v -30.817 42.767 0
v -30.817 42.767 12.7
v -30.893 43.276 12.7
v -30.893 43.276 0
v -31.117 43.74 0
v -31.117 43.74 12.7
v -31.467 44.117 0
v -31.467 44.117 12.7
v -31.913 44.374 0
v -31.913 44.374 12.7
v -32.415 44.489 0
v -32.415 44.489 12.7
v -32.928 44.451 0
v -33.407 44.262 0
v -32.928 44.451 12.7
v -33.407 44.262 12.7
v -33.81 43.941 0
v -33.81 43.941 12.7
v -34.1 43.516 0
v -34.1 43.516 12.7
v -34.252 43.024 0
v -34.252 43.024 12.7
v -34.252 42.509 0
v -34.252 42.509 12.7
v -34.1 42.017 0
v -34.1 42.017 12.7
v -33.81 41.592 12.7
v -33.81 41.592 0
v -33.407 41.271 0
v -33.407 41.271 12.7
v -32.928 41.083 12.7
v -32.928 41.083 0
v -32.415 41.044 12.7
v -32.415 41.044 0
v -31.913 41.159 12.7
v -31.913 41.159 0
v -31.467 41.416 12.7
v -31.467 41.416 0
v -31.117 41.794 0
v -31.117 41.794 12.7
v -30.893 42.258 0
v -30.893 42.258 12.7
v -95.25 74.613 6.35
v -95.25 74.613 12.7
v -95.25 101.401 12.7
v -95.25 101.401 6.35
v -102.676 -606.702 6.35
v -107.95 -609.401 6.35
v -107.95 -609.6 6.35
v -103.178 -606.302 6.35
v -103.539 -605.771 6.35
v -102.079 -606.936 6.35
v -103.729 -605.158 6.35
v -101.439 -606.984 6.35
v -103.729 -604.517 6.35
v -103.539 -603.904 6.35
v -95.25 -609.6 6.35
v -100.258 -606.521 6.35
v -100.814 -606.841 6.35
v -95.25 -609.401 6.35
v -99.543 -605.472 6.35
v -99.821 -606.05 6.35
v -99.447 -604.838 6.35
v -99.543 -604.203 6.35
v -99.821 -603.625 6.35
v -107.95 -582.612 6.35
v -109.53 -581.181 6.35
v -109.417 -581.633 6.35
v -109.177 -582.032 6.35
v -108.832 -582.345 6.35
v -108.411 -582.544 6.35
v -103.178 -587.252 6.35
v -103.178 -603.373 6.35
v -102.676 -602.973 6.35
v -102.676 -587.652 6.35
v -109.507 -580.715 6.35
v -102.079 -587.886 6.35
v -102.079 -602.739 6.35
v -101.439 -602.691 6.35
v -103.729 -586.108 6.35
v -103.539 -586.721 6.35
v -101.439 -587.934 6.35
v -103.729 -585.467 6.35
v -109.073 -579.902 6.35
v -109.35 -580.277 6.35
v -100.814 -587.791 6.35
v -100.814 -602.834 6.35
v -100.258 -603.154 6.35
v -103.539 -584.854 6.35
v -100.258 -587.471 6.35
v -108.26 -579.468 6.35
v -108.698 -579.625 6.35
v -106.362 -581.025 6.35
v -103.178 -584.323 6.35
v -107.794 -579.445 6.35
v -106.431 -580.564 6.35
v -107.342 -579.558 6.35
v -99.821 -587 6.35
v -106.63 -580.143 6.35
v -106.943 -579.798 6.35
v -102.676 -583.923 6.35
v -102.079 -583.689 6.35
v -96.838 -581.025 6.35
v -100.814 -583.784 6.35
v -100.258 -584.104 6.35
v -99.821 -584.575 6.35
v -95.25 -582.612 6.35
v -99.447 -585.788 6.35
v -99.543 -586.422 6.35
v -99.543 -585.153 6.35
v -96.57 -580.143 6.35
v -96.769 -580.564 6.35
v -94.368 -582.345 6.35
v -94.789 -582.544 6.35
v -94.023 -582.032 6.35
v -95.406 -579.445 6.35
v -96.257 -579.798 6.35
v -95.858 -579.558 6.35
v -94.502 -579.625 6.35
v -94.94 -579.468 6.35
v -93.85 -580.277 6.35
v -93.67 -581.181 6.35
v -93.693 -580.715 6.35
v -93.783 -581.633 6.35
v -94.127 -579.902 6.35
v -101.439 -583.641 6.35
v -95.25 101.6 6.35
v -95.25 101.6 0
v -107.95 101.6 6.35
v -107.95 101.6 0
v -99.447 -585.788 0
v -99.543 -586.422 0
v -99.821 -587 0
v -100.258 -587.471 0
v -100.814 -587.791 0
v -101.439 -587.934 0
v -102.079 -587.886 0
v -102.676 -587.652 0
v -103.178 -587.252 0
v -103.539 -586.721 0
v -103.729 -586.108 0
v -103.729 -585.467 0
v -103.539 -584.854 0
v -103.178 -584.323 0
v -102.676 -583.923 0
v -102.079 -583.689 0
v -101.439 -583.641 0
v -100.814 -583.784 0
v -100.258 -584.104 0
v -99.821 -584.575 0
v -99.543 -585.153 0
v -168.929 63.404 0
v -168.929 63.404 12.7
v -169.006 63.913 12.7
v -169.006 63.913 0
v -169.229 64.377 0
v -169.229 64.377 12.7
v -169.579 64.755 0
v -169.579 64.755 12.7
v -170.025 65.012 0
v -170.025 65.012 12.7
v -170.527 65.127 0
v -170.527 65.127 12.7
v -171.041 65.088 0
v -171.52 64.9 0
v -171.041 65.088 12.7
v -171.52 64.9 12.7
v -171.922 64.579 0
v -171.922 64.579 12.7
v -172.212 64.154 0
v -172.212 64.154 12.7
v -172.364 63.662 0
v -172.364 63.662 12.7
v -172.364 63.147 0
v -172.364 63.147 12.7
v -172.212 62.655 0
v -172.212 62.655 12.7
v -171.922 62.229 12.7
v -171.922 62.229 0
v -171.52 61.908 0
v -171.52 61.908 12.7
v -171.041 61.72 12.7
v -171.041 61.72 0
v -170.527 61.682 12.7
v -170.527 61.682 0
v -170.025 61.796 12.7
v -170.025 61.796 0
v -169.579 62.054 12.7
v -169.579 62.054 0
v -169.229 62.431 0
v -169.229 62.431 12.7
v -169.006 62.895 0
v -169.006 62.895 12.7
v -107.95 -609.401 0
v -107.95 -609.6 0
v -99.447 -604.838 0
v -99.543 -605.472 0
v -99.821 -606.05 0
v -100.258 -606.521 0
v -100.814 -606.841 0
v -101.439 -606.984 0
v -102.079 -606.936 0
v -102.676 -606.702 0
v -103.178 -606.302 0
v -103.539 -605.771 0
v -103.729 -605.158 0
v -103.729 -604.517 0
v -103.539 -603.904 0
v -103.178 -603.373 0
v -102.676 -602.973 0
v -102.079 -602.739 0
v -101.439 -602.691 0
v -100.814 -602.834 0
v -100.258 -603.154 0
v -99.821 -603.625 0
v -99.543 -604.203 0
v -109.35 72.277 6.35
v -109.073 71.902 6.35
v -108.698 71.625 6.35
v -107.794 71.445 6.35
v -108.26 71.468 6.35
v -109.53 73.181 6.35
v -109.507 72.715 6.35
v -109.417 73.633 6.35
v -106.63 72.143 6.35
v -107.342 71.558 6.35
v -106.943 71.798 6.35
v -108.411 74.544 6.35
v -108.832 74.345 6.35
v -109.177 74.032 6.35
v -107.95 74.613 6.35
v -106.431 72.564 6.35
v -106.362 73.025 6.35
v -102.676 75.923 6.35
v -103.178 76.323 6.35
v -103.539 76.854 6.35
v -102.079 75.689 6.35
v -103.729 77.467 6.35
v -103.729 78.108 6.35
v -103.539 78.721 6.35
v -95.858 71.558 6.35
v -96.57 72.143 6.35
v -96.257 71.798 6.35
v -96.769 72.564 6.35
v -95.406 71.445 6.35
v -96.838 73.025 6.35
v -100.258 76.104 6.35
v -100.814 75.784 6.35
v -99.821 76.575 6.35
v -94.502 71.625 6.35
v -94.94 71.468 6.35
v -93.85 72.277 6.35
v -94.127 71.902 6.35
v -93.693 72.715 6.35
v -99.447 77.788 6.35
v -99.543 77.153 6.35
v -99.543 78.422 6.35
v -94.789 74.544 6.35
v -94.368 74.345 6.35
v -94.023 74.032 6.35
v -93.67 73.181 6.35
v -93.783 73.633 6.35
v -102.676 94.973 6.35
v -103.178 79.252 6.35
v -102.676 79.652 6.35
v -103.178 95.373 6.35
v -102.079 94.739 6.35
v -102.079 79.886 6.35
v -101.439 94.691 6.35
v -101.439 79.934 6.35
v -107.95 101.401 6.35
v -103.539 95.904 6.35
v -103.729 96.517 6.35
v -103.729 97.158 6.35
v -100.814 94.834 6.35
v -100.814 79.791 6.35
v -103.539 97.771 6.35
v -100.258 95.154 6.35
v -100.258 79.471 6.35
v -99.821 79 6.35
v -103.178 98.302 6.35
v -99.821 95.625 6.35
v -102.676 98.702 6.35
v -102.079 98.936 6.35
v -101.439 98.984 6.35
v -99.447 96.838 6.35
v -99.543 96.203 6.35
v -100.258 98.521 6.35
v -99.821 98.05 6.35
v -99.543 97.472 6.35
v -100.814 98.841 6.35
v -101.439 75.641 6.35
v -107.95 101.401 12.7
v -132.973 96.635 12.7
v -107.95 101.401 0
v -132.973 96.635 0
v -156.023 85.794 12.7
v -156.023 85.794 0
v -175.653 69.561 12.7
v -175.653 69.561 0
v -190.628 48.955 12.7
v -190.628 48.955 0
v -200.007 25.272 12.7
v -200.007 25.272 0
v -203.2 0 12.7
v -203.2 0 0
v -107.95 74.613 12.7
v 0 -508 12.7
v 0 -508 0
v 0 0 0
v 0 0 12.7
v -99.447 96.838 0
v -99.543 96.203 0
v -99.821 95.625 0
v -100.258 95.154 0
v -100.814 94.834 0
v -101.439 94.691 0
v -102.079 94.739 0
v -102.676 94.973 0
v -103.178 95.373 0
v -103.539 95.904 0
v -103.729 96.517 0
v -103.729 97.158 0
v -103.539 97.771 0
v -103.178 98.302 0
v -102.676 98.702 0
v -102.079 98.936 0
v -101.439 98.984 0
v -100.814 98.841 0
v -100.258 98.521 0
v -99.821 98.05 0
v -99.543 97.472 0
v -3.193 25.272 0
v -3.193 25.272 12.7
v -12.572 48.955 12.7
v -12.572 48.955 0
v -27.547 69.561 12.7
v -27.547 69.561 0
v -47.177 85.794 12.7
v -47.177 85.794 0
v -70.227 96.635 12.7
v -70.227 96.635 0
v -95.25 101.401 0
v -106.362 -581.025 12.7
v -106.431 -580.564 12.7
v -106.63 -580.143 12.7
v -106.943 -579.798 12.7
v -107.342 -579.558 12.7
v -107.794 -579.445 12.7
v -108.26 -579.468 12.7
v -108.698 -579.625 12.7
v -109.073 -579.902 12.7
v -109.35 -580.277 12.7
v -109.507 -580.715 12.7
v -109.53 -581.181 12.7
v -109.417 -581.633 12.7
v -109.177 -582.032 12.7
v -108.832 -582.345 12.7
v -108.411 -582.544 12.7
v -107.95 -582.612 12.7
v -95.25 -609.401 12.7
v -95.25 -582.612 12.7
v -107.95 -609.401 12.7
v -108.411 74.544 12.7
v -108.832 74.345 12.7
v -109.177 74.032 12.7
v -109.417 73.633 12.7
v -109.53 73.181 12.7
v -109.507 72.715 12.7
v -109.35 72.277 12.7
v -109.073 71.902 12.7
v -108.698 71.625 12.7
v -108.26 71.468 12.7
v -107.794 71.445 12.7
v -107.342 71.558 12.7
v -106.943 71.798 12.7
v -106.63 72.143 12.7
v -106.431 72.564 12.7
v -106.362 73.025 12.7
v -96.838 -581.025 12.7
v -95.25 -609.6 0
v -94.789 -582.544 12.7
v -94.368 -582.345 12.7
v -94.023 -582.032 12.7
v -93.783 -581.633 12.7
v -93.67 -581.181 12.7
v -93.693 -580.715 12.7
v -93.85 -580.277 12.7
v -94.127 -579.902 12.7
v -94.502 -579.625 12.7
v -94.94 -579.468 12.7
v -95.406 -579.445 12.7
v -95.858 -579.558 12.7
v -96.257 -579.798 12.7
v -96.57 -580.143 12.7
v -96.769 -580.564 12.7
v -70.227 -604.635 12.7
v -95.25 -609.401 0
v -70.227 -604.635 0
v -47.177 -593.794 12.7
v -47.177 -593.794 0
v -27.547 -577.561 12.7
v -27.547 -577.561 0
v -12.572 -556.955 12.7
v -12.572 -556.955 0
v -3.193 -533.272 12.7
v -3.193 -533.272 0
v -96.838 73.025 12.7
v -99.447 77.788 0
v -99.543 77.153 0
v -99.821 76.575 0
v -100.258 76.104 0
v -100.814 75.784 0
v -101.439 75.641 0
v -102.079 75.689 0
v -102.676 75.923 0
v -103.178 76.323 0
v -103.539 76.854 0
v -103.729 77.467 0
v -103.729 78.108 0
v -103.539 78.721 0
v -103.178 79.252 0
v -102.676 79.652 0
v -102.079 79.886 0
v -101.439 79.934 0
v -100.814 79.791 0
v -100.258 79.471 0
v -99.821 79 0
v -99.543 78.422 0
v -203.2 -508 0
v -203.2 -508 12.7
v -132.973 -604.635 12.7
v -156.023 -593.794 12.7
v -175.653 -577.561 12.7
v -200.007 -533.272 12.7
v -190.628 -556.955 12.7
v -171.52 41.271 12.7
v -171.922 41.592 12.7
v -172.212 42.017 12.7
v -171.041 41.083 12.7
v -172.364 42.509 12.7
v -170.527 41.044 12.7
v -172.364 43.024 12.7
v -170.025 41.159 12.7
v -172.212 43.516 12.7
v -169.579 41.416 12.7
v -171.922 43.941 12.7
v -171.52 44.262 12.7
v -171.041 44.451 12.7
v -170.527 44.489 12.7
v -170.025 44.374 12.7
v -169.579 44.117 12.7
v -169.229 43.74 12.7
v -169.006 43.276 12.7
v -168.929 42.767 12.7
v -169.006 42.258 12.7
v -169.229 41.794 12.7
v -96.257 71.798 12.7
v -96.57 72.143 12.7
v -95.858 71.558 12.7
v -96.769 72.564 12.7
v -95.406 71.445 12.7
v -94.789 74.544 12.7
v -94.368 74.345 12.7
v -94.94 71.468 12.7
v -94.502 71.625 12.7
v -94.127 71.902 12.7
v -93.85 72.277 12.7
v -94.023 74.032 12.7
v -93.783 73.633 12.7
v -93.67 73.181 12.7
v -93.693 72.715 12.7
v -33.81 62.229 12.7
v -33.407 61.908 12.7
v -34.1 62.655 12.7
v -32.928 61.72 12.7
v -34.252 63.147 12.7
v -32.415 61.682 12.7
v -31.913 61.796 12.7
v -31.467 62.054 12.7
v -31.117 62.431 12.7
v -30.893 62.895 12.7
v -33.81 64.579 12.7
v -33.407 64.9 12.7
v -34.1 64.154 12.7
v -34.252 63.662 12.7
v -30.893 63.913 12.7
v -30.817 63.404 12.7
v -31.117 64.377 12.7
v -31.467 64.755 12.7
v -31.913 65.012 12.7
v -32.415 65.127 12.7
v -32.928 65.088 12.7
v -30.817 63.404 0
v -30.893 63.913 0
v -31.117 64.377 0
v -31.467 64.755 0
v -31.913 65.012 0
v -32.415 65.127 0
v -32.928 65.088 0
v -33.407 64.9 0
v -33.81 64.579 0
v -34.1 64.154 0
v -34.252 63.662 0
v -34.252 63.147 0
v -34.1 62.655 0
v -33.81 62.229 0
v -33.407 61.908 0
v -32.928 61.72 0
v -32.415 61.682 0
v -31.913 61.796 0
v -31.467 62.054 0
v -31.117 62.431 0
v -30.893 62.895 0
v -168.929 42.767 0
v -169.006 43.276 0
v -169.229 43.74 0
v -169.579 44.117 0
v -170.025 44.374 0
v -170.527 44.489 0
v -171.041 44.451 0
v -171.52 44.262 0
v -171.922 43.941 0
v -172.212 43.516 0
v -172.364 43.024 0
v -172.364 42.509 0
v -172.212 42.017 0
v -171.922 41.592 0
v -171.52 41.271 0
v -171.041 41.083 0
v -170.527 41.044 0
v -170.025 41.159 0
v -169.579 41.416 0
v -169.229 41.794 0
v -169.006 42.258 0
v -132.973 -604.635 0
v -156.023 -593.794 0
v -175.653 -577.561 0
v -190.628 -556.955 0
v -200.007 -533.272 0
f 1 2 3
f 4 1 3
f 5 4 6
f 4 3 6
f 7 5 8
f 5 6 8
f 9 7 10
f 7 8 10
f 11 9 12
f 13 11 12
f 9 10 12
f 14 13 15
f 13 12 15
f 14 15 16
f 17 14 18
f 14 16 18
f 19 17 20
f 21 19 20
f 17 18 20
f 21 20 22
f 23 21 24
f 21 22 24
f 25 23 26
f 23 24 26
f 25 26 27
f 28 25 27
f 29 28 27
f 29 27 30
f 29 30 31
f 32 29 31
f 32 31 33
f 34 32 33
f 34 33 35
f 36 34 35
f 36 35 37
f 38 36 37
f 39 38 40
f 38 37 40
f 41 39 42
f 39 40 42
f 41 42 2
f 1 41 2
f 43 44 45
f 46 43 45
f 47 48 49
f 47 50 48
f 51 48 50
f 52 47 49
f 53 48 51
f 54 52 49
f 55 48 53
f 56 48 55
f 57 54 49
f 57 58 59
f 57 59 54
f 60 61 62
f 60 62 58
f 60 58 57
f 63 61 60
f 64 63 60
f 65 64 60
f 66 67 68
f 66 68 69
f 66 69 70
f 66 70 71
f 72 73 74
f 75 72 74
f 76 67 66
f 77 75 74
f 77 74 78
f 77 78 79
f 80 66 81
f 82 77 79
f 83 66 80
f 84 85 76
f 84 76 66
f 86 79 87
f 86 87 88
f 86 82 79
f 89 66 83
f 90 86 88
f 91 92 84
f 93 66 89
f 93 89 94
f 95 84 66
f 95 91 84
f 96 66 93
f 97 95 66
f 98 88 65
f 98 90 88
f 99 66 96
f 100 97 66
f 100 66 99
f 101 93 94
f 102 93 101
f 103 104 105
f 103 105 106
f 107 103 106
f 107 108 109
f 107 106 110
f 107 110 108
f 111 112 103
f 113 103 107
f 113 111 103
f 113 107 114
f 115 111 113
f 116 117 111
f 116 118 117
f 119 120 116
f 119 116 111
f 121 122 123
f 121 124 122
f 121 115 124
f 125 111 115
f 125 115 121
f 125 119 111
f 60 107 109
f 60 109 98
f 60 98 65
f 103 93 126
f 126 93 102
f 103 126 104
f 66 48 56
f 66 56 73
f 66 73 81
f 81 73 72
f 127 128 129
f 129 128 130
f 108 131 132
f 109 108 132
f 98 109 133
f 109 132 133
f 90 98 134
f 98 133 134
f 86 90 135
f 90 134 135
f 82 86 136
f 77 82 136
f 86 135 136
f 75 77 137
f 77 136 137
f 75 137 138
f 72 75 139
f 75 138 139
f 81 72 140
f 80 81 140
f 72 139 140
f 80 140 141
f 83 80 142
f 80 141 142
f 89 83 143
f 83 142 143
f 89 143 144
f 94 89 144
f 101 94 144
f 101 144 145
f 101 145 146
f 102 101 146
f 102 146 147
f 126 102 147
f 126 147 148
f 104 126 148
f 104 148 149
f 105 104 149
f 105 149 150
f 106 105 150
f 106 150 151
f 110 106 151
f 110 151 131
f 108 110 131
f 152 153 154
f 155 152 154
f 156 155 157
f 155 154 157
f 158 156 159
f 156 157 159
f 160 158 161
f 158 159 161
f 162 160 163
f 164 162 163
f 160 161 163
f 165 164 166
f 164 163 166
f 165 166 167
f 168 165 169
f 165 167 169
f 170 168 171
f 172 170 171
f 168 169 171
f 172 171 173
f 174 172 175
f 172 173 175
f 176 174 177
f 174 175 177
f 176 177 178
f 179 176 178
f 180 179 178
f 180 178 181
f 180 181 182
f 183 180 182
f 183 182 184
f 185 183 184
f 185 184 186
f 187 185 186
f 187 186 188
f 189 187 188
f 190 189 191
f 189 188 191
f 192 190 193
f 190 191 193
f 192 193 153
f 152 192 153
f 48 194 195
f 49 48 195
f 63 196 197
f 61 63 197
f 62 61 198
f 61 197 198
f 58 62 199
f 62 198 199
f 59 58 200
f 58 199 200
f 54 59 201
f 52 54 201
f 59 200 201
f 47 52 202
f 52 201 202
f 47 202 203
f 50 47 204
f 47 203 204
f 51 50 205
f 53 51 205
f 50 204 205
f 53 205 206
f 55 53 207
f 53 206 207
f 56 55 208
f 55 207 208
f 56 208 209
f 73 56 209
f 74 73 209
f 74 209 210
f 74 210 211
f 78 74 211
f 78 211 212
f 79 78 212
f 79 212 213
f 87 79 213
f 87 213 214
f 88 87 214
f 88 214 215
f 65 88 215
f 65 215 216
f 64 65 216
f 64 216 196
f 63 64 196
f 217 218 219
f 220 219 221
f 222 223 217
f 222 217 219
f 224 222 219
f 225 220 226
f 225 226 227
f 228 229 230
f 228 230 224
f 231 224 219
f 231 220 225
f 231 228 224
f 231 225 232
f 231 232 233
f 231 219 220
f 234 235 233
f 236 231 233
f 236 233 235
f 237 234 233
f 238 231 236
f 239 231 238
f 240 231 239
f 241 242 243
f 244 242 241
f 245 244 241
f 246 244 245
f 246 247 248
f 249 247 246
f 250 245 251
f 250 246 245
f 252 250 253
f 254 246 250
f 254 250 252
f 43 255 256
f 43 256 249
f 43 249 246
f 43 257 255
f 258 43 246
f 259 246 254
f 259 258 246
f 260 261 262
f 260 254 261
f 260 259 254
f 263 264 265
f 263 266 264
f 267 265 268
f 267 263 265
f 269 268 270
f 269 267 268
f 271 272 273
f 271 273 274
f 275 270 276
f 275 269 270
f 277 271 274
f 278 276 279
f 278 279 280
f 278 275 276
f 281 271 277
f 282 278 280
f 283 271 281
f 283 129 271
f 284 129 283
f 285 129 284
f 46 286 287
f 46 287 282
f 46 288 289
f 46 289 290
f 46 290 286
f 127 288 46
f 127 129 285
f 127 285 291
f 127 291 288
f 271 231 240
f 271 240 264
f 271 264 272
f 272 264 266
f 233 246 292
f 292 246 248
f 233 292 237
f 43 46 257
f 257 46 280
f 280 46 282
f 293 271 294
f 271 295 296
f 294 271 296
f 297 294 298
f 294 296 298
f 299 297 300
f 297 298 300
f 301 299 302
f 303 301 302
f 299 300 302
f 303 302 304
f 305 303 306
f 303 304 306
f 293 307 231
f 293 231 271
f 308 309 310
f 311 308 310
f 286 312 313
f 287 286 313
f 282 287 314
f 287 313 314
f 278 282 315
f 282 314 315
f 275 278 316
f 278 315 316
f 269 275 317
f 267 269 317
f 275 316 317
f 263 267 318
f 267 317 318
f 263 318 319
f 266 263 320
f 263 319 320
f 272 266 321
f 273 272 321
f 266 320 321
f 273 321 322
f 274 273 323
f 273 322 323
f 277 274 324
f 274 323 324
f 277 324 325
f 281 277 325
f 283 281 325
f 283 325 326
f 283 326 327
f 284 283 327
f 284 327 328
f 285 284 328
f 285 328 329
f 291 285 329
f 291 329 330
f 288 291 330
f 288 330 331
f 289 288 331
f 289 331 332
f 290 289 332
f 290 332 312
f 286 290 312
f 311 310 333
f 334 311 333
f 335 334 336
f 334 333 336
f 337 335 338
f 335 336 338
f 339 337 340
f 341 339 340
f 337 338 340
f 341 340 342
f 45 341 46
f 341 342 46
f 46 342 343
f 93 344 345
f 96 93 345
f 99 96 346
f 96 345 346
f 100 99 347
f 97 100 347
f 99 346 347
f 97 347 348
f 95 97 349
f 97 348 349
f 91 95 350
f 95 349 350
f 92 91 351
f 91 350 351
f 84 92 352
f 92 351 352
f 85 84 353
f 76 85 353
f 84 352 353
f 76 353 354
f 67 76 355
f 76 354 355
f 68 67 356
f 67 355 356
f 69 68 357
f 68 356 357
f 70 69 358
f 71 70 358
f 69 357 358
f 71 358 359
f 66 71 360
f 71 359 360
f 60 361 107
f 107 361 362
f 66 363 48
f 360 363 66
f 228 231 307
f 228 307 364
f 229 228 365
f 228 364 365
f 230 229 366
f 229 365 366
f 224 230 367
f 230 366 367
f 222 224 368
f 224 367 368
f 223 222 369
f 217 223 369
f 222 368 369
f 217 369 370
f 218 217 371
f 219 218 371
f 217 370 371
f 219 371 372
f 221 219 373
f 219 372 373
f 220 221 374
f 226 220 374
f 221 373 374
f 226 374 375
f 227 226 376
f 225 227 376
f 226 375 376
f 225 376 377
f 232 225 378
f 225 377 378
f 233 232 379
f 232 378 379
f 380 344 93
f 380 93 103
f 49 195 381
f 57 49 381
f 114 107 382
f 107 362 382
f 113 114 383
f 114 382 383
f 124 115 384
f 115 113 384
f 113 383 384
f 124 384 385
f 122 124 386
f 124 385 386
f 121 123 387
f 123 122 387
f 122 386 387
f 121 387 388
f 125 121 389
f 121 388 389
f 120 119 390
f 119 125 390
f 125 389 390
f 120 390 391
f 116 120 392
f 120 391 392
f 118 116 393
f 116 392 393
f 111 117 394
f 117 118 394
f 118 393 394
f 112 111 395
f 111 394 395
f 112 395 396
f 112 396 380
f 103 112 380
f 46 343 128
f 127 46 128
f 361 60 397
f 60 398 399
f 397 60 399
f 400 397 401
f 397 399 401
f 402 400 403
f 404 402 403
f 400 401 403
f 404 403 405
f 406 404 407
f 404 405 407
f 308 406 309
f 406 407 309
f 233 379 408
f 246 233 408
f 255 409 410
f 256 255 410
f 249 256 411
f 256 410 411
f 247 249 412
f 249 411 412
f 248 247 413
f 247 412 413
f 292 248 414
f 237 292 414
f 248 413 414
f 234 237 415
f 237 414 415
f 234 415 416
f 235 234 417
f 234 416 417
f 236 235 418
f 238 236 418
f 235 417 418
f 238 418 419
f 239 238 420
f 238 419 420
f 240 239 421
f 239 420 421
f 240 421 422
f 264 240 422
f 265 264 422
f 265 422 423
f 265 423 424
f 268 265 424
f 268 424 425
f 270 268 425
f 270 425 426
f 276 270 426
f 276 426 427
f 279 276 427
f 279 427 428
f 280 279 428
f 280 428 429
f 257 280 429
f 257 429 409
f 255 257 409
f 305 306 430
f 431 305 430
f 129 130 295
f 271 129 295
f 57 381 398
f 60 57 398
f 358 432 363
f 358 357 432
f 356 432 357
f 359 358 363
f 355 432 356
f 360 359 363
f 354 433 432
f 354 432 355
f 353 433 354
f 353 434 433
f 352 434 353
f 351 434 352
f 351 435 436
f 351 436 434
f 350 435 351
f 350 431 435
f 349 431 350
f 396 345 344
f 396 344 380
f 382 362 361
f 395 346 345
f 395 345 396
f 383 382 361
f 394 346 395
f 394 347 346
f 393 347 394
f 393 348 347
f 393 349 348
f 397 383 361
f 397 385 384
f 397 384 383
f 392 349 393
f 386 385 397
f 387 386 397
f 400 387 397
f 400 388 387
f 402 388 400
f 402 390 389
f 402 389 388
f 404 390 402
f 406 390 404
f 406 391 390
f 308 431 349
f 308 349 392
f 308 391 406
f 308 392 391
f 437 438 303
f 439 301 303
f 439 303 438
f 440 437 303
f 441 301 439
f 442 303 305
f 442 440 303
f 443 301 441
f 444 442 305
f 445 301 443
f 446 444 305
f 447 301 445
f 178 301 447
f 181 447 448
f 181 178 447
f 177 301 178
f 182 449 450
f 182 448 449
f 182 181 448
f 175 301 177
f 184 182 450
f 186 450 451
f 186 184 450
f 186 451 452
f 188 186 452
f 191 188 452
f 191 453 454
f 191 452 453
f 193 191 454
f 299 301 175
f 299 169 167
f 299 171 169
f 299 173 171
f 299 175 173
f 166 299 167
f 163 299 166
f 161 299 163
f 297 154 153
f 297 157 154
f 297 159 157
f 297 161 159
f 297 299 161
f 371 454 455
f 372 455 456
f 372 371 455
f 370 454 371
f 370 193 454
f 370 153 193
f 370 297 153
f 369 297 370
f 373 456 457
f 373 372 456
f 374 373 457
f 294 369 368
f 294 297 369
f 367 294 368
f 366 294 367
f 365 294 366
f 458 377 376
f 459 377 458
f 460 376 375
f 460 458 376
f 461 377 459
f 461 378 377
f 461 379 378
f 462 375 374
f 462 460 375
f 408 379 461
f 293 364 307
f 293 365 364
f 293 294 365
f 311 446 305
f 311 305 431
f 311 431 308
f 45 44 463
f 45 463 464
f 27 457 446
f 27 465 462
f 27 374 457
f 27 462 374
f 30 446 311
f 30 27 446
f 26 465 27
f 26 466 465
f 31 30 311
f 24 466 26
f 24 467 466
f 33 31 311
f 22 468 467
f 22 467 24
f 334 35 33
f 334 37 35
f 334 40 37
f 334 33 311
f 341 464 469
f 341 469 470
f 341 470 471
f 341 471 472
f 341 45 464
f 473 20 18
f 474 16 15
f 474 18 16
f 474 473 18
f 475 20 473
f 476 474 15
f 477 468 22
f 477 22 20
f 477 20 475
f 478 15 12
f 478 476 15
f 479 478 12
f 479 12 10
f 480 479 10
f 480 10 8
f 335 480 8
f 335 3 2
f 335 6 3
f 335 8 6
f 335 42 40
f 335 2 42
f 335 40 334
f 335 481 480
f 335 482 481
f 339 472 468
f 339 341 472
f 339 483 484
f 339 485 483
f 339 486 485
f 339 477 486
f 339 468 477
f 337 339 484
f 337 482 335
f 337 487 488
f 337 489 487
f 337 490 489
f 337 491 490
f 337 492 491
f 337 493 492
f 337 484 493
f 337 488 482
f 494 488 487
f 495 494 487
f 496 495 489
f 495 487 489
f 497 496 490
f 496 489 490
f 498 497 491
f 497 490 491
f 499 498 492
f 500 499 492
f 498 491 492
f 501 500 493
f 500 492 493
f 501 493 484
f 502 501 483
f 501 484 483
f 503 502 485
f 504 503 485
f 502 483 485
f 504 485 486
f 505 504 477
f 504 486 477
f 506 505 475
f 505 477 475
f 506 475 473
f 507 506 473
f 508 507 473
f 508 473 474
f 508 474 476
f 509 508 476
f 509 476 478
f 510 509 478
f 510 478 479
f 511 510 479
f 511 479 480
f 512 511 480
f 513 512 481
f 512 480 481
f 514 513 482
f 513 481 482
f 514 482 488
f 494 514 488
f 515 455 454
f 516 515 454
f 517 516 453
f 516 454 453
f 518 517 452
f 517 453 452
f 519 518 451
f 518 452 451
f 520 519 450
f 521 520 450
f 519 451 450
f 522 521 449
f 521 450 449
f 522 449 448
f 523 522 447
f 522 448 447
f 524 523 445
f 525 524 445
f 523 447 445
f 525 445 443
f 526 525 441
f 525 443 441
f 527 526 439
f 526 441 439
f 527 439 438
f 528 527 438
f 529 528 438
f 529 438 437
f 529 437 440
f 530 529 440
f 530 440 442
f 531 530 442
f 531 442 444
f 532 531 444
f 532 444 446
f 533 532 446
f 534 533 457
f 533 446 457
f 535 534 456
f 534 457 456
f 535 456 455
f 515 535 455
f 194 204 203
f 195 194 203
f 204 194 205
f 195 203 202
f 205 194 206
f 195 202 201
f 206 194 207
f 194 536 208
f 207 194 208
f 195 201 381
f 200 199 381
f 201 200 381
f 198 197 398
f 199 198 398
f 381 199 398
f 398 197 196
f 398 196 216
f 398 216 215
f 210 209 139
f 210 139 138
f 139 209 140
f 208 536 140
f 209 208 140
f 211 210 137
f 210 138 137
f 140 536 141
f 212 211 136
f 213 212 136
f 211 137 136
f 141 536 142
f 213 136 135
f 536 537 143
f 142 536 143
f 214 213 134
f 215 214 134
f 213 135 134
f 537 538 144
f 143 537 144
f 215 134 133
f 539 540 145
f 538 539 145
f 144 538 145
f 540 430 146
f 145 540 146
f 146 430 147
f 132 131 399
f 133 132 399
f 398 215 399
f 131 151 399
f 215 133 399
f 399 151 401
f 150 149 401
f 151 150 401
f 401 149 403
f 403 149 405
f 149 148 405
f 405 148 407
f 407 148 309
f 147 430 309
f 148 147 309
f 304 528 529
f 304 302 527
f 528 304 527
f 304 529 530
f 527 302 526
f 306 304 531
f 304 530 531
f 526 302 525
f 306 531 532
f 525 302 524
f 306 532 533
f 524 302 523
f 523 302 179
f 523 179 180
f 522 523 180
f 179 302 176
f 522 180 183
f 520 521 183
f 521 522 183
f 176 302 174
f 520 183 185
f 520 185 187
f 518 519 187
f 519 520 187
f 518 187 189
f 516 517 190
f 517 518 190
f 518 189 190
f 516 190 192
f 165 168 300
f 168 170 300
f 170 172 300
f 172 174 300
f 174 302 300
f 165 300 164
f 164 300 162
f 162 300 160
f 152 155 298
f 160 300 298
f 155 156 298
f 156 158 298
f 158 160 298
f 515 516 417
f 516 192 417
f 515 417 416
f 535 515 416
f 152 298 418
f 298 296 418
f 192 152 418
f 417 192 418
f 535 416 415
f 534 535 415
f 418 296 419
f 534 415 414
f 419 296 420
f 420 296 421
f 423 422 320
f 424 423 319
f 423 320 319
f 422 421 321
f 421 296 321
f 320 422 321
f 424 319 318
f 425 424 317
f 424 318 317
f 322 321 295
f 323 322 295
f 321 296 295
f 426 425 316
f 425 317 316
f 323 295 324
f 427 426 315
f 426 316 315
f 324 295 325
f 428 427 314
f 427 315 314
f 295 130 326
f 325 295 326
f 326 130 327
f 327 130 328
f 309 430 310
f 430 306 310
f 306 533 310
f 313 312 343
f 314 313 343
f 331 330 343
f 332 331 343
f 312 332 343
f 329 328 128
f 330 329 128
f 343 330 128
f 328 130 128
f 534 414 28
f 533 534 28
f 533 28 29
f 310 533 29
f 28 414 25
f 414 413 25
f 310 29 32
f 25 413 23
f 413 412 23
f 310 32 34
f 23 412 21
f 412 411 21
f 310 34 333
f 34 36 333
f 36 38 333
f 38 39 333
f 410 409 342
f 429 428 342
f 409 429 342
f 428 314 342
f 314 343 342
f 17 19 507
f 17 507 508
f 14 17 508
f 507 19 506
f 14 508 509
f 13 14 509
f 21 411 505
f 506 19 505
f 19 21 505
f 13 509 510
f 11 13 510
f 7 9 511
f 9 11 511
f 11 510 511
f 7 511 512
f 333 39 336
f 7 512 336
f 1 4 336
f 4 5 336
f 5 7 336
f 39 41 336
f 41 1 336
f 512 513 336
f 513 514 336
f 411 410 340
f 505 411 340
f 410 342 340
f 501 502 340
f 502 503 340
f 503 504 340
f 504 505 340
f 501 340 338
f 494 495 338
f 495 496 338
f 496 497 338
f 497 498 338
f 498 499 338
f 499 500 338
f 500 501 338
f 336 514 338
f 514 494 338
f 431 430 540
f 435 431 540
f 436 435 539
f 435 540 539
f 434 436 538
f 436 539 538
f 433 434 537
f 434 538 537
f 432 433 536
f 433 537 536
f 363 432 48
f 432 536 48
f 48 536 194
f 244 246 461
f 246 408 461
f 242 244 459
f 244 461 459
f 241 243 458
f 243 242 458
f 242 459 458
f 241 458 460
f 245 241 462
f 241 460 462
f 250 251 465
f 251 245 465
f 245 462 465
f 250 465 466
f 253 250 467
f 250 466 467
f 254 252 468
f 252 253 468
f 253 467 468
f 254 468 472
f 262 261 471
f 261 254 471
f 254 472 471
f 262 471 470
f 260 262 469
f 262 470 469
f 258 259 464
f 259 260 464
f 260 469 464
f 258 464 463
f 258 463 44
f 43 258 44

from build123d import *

# Parameters (mm, degrees)
F1_DEPTH = 12.7
F2_R     = 1.7272
F3_DEPTH = 12.7
F4_W     = 12.7
F4_H     = 28.575
F5_DEPTH = 6.35
F6_R     = 1.5875
F7_DEPTH = 6.35
F8_R     = 2.15265
F9_DEPTH = 12.7


with BuildPart() as f1:
    # F0 (on Top) → F1 (new body)
    with BuildSketch(Plane.XY):
        with BuildLine():
            Line((0, -508), (0, 0))
            ThreePointArc((0, 0), (-27.5469109355, 69.5607648032), (-95.25, 101.401368334))
            Line((-95.25, 101.401368334), (-95.25, 101.6))
            Line((-95.25, 101.6), (-107.95, 101.6))
            Line((-107.95, 101.6), (-107.95, 101.401368334))
            ThreePointArc((-107.95, 101.401368334), (-175.6530890645, 69.5607648032), (-203.2, 0))
            Line((-203.2, 0), (-203.2, -508))
            ThreePointArc((-203.2, -508), (-175.6530890645, -577.5607648032), (-107.95, -609.401368334))
            Line((-107.95, -609.401368334), (-107.95, -609.6))
            Line((-107.95, -609.6), (-95.25, -609.6))
            Line((-95.25, -609.6), (-95.25, -609.401368334))
            ThreePointArc((-95.25, -609.401368334), (-27.5469109355, -577.5607648032), (0, -508))
        make_face()
    extrude(amount=F1_DEPTH)

    # F2 (on face) → F3 (cut, through all)
    with BuildSketch(Plane.XY.offset(12.7)):
        with Locations((-32.54375, 63.404136047)):
            Circle(F2_R)
        with Locations((-32.54375, 42.766636047)):
            Circle(F2_R)
        with Locations((-170.65625, 42.766636047)):
            Circle(F2_R)
        with Locations((-170.65625, 63.404136047)):
            Circle(F2_R)
    extrude(amount=-F3_DEPTH, mode=Mode.SUBTRACT)

    # F4 (on face) → F5 (cut)
    with BuildSketch(Plane.XY.offset(12.7)):
        with Locations((-101.6, 87.3125)):
            Rectangle(F4_W, F4_H)
        with Locations((-101.6, -595.3125)):
            Rectangle(F4_W, F4_H)
    extrude(amount=-F5_DEPTH, mode=Mode.SUBTRACT)

    # F6 (on face) → F7 (cut, through all)
    with BuildSketch(Plane.XY.offset(12.7)):
        with Locations((-107.95, -581.025)):
            Circle(F6_R)
        with Locations((-95.25, -581.025)):
            Circle(F6_R)
        with Locations((-107.95, 73.025)):
            Circle(F6_R)
        with Locations((-95.25, 73.025)):
            Circle(F6_R)
    extrude(amount=-F7_DEPTH, mode=Mode.SUBTRACT)

    # F8 (on face) → F9 (cut, through all)
    with BuildSketch(Plane(origin=(0, 0, 0), x_dir=(1, 0, 0), z_dir=(0, 0, -1))):
        with Locations((-101.6, -96.8375)):
            Circle(F8_R)
        with Locations((-101.6, -77.7875)):
            Circle(F8_R)
        with Locations((-101.6, 604.8375)):
            Circle(F8_R)
        with Locations((-101.6, 585.7875)):
            Circle(F8_R)
    extrude(amount=-F9_DEPTH, mode=Mode.SUBTRACT)


solid = f1.part
